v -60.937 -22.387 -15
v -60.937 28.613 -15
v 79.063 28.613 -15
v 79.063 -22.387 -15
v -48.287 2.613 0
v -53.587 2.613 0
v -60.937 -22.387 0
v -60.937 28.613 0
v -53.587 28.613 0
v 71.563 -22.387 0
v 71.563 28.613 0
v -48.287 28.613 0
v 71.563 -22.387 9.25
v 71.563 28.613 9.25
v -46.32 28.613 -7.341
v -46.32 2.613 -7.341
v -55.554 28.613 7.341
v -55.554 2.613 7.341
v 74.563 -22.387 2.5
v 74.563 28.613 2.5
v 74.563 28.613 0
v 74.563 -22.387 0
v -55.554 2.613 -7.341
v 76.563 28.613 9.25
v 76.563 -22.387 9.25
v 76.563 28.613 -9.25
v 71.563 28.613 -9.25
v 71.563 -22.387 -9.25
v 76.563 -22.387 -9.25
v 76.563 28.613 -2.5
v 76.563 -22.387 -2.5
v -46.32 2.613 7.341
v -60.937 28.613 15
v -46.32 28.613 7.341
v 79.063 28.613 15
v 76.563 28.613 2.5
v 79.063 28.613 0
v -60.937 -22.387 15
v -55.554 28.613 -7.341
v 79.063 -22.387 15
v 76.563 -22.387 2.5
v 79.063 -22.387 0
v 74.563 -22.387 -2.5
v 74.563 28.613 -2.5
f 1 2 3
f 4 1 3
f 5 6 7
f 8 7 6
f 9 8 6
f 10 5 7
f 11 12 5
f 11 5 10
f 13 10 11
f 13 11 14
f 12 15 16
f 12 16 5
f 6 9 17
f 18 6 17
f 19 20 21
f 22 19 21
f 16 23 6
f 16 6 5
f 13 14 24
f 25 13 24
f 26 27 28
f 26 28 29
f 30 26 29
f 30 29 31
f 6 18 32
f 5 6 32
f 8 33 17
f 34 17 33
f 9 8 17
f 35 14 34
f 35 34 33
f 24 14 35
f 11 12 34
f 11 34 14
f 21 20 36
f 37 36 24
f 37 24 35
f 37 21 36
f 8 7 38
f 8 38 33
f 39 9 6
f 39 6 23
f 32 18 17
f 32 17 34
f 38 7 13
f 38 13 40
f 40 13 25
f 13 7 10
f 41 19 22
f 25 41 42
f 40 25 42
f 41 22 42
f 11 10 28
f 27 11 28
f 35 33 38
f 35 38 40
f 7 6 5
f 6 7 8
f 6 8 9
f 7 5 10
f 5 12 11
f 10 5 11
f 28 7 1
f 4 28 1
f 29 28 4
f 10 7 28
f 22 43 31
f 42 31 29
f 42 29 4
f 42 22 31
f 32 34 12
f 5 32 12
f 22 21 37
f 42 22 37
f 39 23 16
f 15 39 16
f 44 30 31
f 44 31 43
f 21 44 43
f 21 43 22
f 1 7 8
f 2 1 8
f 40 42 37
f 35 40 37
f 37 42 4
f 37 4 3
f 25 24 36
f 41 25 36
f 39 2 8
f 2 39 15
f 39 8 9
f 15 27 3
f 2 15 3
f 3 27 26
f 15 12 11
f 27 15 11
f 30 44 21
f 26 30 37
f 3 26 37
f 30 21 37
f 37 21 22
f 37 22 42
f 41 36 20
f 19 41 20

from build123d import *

# Parameters (mm, degrees)
SKETCH1_W               = 140
SKETCH1_H               = 51
BOSS_EXTRUDE1_DEPTH     = 15
CUT_EXTRUDE1_DEPTH      = 52
CUT_EXTRUDE2_DEPTH      = 1
CUT_EXTRUDE2_DEPTH_BACK = 26


with BuildPart() as part:
    # Sketch1 → Boss-Extrude1 (new body)
    with BuildSketch(Plane.XY):
        with Locations((9.063380282, 3.112676056)):
            Rectangle(SKETCH1_W, SKETCH1_H)
    extrude(amount=BOSS_EXTRUDE1_DEPTH)

    # Sketch2 → Cut-Extrude1 (cut, through all)
    with BuildSketch(Plane(origin=(0, 28.612676056, 0), x_dir=(1, 0, 0), z_dir=(0, 1, 0))):
        Polygon((74.563380282, -2.5), (74.563380282, 0), (71.563380282, 0), (71.563380282, -2.5), (71.563380282, -9.25), (76.563380282, -9.25), (76.563380282, -2.5), align=None)
    extrude(amount=-CUT_EXTRUDE1_DEPTH, mode=Mode.SUBTRACT)

    # Sketch3 → Cut-Extrude2 (cut, two sides)
    with BuildSketch(Plane(origin=(0, 28.612676056, 0), x_dir=(1, 0, 0), z_dir=(0, 1, 0))) as cut_extrude2_sk:
        Polygon((-352.539176525, 0), (-60.936619718, 0), (-53.586619718, 0), (-55.553644461, -7.34103628), (-46.319594976, -7.34103628), (-48.286619718, 0), (-123.75891502, 281.666440631), (-576.450550722, 649.359910128), (-805.230812226, 367.693469497), align=None)
    extrude(amount=CUT_EXTRUDE2_DEPTH, mode=Mode.SUBTRACT)
    extrude(cut_extrude2_sk.sketch, amount=-CUT_EXTRUDE2_DEPTH_BACK, mode=Mode.SUBTRACT)


with BuildPart() as body_2:
    # Mirror1: mirrored copy
    add(part.part.mirror(Plane.XY))


solid = Compound([part.part, body_2.part])
